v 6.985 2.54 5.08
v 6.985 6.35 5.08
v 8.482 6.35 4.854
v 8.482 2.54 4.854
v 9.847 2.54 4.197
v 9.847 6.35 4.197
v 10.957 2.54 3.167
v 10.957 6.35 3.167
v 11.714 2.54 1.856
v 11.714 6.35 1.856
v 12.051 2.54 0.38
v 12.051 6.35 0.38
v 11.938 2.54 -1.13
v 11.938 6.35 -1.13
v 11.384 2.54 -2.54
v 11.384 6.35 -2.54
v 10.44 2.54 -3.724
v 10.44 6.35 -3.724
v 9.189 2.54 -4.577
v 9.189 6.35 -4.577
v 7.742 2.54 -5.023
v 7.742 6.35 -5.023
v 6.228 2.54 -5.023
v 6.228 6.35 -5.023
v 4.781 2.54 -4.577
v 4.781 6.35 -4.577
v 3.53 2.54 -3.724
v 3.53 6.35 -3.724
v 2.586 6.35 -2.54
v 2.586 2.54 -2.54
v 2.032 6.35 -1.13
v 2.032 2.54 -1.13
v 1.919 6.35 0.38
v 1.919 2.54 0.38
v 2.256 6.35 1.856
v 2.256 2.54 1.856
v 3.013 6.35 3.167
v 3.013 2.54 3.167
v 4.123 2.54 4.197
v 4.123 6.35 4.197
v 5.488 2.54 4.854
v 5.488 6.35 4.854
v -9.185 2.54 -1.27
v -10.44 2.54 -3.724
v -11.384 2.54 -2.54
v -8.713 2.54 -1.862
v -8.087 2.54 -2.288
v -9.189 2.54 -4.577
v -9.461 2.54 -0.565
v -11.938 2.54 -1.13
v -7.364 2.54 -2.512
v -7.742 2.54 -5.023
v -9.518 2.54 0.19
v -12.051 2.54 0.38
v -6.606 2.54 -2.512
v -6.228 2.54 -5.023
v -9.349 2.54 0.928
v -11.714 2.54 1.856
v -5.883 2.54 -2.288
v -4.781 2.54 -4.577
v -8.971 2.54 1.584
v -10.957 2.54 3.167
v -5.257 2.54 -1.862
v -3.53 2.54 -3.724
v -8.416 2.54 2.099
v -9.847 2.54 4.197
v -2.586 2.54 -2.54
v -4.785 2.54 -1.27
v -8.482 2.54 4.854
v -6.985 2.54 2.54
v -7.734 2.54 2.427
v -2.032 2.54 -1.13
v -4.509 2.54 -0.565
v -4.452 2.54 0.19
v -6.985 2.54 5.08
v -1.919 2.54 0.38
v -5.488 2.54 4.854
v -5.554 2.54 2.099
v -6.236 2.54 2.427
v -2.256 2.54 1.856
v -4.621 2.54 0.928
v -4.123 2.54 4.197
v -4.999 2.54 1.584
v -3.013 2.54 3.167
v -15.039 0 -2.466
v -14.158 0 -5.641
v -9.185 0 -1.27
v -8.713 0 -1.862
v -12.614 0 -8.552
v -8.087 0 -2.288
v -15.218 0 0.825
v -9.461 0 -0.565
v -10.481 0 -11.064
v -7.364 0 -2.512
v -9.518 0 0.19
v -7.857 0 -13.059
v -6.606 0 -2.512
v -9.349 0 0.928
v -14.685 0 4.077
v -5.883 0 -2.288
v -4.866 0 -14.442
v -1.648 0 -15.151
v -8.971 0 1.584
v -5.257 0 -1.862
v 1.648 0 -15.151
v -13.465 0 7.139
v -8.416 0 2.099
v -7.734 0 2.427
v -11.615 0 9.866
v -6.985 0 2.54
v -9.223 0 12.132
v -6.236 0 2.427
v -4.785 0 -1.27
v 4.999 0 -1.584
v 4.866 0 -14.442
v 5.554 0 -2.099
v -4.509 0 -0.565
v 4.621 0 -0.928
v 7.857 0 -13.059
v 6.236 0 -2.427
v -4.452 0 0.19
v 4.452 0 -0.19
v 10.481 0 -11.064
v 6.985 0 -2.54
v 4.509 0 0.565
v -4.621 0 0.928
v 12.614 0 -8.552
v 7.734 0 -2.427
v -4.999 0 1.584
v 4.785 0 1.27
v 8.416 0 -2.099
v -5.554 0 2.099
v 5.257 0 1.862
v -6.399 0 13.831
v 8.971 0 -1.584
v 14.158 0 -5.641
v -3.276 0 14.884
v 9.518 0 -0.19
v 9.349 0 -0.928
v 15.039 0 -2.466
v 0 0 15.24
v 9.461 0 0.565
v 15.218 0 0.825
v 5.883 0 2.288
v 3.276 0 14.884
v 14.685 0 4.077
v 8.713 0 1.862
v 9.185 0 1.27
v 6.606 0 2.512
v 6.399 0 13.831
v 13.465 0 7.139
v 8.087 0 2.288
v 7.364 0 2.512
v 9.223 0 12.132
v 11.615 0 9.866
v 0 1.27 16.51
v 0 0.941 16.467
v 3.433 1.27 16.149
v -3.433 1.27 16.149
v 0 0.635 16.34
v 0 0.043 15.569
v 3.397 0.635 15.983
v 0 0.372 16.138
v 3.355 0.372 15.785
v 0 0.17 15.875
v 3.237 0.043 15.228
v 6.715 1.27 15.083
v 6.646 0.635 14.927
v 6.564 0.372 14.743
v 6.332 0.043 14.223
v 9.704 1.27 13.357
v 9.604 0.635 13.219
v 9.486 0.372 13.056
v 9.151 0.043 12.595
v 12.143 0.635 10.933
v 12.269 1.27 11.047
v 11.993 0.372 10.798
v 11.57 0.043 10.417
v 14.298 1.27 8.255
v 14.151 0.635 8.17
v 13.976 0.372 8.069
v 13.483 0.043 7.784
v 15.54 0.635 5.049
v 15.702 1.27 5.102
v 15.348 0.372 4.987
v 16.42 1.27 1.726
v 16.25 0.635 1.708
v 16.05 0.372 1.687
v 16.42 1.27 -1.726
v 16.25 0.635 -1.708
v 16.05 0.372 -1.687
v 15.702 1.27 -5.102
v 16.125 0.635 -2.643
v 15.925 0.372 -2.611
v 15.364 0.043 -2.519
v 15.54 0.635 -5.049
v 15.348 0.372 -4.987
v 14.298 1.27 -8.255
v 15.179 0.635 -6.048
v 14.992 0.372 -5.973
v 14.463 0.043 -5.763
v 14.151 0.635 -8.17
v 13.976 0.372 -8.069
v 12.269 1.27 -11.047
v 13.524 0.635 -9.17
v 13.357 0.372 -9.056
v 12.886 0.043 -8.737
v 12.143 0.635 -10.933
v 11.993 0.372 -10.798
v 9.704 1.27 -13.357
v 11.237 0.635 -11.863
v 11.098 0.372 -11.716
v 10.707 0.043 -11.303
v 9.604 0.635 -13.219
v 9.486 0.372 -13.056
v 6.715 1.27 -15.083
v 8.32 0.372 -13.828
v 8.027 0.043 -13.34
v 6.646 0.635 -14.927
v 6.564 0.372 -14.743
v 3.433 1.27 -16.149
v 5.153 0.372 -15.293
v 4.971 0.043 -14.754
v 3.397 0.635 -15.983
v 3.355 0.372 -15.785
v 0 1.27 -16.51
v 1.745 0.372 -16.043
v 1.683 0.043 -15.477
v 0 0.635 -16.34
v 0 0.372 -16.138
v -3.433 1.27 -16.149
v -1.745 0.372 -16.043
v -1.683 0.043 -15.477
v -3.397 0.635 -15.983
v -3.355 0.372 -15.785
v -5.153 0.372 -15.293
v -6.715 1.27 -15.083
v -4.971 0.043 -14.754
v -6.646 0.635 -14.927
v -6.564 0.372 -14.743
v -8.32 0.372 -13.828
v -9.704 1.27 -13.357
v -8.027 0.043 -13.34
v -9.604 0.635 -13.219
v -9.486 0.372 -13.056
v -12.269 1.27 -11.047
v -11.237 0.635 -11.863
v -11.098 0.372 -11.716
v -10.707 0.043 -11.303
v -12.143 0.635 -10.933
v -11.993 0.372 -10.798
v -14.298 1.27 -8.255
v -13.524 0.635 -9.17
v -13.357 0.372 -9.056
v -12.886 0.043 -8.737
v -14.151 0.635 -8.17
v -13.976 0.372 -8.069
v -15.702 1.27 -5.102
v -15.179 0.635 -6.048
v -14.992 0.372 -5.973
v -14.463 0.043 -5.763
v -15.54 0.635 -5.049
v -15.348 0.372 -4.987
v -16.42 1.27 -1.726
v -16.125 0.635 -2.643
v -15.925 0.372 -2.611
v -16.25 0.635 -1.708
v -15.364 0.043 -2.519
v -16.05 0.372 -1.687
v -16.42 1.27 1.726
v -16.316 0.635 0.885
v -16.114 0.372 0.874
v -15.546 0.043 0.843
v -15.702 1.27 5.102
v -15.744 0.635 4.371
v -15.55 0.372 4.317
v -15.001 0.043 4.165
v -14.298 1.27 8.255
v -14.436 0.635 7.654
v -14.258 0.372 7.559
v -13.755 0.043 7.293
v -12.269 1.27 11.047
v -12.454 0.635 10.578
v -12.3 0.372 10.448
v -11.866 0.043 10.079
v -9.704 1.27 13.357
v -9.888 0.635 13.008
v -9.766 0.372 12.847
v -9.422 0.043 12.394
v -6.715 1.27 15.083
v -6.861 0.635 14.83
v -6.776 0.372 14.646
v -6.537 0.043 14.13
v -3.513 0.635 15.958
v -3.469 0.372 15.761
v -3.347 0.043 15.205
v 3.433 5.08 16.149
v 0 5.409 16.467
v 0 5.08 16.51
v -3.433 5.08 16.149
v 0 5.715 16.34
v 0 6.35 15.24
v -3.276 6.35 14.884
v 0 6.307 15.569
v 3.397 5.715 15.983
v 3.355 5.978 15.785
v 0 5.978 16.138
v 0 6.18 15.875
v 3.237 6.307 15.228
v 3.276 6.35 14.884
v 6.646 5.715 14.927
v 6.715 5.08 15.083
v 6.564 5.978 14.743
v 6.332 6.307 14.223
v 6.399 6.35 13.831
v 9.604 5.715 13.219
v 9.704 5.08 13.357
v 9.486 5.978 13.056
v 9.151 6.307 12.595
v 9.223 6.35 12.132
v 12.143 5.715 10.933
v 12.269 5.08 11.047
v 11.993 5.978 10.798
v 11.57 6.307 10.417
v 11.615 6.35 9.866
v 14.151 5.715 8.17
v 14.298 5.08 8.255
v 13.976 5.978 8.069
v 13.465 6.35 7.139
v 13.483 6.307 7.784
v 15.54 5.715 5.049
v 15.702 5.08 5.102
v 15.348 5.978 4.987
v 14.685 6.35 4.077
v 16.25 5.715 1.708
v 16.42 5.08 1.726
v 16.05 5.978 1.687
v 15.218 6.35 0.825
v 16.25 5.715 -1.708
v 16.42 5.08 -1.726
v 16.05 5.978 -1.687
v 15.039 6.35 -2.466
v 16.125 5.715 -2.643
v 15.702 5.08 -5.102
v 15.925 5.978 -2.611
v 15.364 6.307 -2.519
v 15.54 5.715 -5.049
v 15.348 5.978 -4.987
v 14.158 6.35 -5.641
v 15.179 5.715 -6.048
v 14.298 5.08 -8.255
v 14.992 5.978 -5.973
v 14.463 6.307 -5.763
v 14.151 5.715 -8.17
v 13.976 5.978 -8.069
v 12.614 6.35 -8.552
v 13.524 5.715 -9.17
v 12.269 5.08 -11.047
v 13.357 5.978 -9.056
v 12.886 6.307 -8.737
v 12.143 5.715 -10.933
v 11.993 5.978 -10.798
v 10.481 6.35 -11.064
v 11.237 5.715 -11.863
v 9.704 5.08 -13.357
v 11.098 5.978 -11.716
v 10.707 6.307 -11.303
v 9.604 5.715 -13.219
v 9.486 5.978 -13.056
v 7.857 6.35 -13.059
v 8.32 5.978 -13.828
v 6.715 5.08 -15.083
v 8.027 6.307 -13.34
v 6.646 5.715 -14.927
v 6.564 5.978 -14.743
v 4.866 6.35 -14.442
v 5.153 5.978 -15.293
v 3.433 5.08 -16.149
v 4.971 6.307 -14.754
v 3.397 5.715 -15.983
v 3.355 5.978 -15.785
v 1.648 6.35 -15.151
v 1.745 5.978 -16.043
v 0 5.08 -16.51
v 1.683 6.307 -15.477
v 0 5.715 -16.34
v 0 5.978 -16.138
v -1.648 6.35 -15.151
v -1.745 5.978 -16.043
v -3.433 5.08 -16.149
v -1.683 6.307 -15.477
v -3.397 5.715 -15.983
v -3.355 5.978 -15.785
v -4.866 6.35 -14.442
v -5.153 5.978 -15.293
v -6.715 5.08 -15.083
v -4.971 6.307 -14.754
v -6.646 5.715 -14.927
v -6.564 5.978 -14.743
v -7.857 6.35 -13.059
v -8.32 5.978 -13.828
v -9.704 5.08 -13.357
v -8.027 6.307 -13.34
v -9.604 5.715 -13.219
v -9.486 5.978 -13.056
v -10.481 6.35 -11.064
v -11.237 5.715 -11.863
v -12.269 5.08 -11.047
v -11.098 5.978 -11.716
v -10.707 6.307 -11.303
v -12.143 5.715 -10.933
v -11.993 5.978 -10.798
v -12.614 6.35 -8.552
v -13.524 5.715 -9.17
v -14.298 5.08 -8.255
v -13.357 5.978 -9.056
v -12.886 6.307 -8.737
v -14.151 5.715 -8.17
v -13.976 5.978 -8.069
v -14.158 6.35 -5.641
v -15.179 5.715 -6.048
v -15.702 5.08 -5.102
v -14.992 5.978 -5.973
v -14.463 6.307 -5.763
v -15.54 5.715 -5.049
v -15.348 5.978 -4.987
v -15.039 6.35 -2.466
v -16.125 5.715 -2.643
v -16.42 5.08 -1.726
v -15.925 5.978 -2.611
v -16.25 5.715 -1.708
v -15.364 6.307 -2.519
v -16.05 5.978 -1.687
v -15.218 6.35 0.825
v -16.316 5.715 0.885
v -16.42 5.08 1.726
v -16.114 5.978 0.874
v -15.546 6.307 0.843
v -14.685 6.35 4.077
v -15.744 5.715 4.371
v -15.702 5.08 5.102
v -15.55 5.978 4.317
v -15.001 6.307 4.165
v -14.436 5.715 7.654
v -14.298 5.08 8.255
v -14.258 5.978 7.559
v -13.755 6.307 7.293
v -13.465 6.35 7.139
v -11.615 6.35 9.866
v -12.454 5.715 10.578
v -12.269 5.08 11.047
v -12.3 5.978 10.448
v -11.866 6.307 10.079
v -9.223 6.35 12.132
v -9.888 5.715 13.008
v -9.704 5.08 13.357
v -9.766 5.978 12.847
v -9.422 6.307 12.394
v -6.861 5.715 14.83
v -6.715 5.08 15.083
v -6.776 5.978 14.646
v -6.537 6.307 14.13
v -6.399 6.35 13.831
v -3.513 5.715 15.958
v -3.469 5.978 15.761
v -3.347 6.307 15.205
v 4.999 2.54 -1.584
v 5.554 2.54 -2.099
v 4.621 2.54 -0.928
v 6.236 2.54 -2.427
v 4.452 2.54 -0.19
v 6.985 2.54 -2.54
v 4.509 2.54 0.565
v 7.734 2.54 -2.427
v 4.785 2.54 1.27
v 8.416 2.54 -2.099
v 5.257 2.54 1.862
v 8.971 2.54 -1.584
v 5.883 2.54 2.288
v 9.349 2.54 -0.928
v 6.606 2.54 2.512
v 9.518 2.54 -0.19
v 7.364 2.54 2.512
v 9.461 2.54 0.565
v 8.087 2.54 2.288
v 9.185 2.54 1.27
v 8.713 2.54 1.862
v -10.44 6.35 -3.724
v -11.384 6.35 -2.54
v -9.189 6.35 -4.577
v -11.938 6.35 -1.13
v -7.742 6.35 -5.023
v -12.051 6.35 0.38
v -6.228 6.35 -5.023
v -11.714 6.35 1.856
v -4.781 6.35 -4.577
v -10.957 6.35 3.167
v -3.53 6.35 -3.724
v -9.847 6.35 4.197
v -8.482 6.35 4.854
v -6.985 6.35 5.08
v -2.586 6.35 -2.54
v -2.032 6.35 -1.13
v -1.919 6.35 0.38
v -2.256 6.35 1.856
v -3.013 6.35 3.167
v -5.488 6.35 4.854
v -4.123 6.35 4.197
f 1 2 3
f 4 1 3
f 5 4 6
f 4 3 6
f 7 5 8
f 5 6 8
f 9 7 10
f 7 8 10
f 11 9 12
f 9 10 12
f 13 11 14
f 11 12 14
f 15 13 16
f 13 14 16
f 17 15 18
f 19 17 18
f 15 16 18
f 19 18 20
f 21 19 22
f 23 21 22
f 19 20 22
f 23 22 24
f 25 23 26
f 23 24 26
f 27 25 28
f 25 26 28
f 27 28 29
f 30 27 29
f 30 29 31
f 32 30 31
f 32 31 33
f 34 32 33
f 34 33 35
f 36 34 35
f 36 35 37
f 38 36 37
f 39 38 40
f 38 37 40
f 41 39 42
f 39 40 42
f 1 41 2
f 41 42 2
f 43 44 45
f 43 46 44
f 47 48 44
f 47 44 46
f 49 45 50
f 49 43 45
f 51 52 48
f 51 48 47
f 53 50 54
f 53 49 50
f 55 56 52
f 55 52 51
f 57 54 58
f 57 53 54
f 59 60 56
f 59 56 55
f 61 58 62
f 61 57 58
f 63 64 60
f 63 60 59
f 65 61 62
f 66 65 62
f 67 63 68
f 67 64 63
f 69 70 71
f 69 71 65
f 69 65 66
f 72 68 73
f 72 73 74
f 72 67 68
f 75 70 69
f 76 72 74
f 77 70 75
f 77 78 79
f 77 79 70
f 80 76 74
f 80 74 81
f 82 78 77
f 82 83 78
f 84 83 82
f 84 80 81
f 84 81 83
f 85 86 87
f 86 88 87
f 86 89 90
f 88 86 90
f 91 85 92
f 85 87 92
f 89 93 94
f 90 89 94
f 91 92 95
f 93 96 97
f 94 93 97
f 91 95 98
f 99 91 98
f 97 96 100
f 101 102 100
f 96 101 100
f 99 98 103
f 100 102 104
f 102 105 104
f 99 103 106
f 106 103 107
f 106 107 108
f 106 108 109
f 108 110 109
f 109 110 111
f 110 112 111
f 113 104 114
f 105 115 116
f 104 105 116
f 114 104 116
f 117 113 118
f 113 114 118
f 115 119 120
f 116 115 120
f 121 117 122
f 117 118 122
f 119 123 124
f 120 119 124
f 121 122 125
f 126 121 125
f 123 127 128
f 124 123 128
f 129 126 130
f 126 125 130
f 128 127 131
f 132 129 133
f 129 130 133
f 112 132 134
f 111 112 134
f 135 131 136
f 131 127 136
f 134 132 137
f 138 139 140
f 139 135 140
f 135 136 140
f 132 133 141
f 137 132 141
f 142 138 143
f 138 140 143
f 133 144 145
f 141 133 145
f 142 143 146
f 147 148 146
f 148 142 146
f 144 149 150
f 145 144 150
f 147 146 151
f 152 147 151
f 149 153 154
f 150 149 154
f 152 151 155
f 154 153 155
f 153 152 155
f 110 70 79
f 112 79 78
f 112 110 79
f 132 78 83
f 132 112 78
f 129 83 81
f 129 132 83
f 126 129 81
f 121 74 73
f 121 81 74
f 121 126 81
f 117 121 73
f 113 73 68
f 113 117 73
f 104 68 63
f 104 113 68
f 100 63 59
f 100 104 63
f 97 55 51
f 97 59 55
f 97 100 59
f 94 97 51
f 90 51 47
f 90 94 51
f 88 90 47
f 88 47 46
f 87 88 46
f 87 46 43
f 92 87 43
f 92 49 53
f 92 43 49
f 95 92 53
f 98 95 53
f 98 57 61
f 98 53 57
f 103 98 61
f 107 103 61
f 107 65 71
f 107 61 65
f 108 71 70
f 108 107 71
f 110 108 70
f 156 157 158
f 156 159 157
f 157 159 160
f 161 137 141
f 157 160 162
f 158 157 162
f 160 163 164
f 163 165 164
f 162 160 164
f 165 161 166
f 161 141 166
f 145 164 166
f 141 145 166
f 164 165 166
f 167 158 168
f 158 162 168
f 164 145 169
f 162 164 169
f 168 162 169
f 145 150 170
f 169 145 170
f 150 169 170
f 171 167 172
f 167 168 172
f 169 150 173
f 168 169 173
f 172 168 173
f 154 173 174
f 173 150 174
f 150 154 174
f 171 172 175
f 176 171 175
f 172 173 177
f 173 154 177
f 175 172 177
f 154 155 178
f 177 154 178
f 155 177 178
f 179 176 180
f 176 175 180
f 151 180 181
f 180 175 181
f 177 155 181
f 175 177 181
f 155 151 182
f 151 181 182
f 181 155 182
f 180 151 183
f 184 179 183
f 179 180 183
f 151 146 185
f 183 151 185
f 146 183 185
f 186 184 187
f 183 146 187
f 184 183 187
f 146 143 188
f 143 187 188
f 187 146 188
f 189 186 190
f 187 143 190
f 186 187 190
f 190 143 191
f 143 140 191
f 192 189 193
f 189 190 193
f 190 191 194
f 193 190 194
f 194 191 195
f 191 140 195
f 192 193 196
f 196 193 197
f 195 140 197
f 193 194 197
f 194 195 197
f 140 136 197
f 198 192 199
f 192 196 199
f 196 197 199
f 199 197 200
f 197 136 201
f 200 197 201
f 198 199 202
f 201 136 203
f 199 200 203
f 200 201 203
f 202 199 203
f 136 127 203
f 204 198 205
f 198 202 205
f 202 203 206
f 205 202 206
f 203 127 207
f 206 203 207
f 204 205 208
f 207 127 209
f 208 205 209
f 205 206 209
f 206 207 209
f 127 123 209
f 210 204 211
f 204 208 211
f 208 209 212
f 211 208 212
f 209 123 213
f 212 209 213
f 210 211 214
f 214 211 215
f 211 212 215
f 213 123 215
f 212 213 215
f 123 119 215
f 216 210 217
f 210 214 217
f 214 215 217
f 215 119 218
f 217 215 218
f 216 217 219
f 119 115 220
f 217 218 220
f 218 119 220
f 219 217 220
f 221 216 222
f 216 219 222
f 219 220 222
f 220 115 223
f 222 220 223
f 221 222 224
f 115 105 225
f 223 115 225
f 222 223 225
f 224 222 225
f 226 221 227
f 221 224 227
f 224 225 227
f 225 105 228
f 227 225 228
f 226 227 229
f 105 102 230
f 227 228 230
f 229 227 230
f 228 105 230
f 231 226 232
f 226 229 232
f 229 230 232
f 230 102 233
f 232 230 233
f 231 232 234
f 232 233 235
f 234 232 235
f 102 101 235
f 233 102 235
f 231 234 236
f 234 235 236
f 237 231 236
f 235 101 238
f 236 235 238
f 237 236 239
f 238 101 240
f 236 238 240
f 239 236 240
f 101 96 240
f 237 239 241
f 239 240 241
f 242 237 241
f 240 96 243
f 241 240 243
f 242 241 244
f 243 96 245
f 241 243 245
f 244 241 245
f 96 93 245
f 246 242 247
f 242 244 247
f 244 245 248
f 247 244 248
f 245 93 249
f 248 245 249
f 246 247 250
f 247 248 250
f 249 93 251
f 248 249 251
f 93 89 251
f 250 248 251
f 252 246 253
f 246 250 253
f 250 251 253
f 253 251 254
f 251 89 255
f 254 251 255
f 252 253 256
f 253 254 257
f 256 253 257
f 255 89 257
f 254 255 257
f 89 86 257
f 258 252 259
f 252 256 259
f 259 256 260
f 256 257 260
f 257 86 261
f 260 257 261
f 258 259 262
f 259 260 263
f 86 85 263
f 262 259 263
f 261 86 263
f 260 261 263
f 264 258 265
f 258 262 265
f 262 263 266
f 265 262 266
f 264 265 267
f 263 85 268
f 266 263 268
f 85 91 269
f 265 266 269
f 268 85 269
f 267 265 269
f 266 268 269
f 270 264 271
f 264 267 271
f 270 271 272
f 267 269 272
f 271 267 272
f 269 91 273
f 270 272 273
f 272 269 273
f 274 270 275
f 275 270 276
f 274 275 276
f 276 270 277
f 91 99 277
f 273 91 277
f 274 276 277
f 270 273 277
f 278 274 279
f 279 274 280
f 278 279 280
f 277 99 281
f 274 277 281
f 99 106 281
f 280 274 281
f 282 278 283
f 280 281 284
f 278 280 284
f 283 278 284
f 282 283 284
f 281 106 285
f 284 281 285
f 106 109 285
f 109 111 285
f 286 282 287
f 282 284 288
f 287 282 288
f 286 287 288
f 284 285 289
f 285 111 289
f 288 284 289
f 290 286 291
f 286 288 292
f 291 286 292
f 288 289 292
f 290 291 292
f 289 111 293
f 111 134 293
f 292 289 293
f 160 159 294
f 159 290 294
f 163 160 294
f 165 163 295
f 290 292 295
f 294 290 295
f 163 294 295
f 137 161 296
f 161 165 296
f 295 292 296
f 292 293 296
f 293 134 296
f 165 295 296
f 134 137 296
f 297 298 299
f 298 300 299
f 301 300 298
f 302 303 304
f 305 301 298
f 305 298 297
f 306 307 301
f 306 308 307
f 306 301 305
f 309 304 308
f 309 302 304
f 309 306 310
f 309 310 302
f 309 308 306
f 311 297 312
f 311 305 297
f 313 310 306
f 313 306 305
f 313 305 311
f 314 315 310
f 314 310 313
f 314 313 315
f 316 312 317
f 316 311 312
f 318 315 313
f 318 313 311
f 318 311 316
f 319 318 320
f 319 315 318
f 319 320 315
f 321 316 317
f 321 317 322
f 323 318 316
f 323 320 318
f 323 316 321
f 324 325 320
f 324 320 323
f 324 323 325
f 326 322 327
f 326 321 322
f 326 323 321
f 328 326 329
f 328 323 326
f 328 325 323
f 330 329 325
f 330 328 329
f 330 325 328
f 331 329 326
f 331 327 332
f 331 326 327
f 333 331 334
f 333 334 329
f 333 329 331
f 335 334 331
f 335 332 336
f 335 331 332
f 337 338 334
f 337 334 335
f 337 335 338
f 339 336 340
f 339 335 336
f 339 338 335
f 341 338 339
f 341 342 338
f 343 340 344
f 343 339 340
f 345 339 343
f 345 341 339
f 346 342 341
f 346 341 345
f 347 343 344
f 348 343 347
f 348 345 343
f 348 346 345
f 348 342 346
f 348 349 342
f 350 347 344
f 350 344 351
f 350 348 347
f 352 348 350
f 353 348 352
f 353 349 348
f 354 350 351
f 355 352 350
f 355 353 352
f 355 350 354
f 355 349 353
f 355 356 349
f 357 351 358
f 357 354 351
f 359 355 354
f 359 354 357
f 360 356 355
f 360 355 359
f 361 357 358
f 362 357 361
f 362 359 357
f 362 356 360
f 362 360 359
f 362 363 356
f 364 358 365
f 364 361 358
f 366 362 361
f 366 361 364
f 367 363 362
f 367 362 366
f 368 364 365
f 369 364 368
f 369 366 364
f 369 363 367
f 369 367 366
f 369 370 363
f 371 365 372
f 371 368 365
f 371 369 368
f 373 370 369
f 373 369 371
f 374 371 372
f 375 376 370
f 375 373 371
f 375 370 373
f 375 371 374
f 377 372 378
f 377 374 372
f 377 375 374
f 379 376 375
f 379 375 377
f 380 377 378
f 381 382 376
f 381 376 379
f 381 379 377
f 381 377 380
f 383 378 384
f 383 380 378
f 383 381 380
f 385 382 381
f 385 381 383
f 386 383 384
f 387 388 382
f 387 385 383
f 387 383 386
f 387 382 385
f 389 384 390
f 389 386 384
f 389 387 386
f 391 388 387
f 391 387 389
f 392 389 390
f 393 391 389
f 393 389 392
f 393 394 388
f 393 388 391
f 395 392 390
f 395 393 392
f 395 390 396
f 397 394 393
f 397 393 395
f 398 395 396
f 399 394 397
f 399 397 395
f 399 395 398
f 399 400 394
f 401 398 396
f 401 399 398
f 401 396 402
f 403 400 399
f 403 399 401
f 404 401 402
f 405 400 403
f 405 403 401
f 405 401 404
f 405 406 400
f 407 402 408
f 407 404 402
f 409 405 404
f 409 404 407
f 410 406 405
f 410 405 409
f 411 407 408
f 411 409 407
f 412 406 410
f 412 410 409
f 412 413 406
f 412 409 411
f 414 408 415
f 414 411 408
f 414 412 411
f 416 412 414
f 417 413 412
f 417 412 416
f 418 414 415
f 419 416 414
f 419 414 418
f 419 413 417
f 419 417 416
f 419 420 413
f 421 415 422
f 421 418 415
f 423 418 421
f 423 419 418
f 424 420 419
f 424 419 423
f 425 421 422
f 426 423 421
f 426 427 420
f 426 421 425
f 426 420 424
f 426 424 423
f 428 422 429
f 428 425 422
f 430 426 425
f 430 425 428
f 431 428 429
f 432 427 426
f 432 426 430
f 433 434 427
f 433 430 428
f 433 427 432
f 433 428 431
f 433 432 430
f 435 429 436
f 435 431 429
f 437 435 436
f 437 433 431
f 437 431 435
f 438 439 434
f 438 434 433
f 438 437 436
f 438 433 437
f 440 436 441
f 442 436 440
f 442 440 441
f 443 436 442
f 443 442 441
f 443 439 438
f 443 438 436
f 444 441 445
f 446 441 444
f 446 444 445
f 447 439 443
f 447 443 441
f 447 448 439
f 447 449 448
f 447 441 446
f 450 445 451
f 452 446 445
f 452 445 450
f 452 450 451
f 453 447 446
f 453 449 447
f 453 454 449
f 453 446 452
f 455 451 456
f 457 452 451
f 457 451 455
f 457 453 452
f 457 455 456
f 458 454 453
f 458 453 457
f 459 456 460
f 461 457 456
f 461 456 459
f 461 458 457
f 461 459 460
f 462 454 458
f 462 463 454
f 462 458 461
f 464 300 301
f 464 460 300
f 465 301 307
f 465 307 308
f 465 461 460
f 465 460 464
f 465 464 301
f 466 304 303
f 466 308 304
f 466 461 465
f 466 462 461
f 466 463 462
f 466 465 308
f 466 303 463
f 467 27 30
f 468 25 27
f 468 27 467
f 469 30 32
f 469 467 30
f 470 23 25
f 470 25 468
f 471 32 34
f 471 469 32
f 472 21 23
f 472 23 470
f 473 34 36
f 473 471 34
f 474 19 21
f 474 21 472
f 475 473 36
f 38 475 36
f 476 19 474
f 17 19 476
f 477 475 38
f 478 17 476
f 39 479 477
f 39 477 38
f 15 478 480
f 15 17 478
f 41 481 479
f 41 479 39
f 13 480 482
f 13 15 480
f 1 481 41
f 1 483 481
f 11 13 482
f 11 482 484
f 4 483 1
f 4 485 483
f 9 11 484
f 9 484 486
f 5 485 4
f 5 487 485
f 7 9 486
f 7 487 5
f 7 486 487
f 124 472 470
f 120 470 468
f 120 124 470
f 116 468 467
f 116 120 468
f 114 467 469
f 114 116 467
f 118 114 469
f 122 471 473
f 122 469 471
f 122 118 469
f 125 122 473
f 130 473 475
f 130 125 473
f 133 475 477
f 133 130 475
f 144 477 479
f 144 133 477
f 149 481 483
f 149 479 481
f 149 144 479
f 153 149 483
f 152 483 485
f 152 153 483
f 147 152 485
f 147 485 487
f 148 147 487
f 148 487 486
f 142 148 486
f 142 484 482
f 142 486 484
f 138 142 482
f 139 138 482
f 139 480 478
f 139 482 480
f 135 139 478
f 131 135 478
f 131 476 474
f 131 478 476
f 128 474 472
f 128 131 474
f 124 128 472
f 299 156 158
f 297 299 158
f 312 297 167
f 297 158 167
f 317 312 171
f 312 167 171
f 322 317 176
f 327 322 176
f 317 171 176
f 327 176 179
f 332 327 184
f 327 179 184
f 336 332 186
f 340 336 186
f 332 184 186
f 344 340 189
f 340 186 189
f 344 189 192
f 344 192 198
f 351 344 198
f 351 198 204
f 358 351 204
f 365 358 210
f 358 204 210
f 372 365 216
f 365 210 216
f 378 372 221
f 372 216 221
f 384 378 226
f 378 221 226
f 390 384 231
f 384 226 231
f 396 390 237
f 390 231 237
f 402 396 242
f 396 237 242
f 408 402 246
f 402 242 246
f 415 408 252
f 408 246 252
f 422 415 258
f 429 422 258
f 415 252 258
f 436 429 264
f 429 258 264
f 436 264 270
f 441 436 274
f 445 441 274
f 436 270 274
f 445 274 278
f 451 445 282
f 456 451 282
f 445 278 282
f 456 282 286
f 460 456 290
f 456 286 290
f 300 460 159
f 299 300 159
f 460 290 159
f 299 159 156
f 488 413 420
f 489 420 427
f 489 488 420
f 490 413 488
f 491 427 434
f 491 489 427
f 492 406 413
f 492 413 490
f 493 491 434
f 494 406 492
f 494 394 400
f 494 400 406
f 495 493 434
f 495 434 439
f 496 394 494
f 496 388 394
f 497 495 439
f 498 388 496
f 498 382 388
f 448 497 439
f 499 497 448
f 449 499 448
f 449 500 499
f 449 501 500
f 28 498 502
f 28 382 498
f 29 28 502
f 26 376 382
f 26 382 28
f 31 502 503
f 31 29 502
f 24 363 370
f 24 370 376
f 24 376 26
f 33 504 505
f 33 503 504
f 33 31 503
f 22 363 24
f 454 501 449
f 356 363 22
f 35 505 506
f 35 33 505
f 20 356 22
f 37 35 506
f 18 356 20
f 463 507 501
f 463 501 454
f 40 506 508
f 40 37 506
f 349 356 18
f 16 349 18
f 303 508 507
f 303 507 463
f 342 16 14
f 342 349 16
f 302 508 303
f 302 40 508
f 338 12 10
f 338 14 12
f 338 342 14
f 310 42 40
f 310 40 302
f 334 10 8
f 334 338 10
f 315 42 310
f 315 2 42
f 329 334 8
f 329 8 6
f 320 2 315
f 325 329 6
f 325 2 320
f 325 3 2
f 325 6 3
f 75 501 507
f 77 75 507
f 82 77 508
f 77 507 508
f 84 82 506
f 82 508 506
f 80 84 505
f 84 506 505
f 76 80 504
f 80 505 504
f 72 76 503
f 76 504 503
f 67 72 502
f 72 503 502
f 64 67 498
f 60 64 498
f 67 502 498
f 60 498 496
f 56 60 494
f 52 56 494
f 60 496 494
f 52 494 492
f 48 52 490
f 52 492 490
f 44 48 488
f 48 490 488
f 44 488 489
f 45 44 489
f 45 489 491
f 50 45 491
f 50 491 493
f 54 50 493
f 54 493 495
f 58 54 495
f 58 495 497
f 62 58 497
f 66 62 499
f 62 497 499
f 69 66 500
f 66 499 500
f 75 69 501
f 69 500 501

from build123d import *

# Parameters (mm, degrees)
SKETCH1_R           = 16.51
SKETCH1_R_2         = 2.54
BOSS_EXTRUDE1_DEPTH = 6.35
SKETCH2_R           = 5.08
CUT_EXTRUDE1_DEPTH  = 3.81
FILLET1_R           = 1.27


with BuildPart() as part:
    # Sketch1 → Boss-Extrude1 (new body)
    with BuildSketch(Plane(origin=(0, 0, 0), x_dir=(1, 0, 0), z_dir=(0, 1, 0))):
        with Locations(Location((0, 0, 0), (0, 0, 270))):
            Circle(SKETCH1_R)
        with Locations(Location((-6.985, 0, 0), (0, 0, 270))):
            Circle(SKETCH1_R_2, mode=Mode.SUBTRACT)
        with Locations(Location((6.985, 0, 0), (0, 0, 90))):
            Circle(SKETCH1_R_2, mode=Mode.SUBTRACT)
    extrude(amount=BOSS_EXTRUDE1_DEPTH)

    # Sketch2 → Cut-Extrude1 (cut)
    with BuildSketch(Plane(origin=(0, 6.35, 0), x_dir=(1, 0, 0), z_dir=(0, 1, 0))):
        with Locations(Location((-6.985, 0, 0), (0, 0, 270))):
            Circle(SKETCH2_R)
        with Locations(Location((6.985, 0, 0), (0, 0, 270))):
            Circle(SKETCH2_R)
    extrude(amount=-CUT_EXTRUDE1_DEPTH, mode=Mode.SUBTRACT)

    # Fillet1
    fillet1_edges = [part.edges().sort_by_distance(p)[0] for p in [
        (0, 0, -16.51),
        (0, 6.35, -16.51),
    ]]
    fillet(fillet1_edges, radius=FILLET1_R)


solid = part.part
